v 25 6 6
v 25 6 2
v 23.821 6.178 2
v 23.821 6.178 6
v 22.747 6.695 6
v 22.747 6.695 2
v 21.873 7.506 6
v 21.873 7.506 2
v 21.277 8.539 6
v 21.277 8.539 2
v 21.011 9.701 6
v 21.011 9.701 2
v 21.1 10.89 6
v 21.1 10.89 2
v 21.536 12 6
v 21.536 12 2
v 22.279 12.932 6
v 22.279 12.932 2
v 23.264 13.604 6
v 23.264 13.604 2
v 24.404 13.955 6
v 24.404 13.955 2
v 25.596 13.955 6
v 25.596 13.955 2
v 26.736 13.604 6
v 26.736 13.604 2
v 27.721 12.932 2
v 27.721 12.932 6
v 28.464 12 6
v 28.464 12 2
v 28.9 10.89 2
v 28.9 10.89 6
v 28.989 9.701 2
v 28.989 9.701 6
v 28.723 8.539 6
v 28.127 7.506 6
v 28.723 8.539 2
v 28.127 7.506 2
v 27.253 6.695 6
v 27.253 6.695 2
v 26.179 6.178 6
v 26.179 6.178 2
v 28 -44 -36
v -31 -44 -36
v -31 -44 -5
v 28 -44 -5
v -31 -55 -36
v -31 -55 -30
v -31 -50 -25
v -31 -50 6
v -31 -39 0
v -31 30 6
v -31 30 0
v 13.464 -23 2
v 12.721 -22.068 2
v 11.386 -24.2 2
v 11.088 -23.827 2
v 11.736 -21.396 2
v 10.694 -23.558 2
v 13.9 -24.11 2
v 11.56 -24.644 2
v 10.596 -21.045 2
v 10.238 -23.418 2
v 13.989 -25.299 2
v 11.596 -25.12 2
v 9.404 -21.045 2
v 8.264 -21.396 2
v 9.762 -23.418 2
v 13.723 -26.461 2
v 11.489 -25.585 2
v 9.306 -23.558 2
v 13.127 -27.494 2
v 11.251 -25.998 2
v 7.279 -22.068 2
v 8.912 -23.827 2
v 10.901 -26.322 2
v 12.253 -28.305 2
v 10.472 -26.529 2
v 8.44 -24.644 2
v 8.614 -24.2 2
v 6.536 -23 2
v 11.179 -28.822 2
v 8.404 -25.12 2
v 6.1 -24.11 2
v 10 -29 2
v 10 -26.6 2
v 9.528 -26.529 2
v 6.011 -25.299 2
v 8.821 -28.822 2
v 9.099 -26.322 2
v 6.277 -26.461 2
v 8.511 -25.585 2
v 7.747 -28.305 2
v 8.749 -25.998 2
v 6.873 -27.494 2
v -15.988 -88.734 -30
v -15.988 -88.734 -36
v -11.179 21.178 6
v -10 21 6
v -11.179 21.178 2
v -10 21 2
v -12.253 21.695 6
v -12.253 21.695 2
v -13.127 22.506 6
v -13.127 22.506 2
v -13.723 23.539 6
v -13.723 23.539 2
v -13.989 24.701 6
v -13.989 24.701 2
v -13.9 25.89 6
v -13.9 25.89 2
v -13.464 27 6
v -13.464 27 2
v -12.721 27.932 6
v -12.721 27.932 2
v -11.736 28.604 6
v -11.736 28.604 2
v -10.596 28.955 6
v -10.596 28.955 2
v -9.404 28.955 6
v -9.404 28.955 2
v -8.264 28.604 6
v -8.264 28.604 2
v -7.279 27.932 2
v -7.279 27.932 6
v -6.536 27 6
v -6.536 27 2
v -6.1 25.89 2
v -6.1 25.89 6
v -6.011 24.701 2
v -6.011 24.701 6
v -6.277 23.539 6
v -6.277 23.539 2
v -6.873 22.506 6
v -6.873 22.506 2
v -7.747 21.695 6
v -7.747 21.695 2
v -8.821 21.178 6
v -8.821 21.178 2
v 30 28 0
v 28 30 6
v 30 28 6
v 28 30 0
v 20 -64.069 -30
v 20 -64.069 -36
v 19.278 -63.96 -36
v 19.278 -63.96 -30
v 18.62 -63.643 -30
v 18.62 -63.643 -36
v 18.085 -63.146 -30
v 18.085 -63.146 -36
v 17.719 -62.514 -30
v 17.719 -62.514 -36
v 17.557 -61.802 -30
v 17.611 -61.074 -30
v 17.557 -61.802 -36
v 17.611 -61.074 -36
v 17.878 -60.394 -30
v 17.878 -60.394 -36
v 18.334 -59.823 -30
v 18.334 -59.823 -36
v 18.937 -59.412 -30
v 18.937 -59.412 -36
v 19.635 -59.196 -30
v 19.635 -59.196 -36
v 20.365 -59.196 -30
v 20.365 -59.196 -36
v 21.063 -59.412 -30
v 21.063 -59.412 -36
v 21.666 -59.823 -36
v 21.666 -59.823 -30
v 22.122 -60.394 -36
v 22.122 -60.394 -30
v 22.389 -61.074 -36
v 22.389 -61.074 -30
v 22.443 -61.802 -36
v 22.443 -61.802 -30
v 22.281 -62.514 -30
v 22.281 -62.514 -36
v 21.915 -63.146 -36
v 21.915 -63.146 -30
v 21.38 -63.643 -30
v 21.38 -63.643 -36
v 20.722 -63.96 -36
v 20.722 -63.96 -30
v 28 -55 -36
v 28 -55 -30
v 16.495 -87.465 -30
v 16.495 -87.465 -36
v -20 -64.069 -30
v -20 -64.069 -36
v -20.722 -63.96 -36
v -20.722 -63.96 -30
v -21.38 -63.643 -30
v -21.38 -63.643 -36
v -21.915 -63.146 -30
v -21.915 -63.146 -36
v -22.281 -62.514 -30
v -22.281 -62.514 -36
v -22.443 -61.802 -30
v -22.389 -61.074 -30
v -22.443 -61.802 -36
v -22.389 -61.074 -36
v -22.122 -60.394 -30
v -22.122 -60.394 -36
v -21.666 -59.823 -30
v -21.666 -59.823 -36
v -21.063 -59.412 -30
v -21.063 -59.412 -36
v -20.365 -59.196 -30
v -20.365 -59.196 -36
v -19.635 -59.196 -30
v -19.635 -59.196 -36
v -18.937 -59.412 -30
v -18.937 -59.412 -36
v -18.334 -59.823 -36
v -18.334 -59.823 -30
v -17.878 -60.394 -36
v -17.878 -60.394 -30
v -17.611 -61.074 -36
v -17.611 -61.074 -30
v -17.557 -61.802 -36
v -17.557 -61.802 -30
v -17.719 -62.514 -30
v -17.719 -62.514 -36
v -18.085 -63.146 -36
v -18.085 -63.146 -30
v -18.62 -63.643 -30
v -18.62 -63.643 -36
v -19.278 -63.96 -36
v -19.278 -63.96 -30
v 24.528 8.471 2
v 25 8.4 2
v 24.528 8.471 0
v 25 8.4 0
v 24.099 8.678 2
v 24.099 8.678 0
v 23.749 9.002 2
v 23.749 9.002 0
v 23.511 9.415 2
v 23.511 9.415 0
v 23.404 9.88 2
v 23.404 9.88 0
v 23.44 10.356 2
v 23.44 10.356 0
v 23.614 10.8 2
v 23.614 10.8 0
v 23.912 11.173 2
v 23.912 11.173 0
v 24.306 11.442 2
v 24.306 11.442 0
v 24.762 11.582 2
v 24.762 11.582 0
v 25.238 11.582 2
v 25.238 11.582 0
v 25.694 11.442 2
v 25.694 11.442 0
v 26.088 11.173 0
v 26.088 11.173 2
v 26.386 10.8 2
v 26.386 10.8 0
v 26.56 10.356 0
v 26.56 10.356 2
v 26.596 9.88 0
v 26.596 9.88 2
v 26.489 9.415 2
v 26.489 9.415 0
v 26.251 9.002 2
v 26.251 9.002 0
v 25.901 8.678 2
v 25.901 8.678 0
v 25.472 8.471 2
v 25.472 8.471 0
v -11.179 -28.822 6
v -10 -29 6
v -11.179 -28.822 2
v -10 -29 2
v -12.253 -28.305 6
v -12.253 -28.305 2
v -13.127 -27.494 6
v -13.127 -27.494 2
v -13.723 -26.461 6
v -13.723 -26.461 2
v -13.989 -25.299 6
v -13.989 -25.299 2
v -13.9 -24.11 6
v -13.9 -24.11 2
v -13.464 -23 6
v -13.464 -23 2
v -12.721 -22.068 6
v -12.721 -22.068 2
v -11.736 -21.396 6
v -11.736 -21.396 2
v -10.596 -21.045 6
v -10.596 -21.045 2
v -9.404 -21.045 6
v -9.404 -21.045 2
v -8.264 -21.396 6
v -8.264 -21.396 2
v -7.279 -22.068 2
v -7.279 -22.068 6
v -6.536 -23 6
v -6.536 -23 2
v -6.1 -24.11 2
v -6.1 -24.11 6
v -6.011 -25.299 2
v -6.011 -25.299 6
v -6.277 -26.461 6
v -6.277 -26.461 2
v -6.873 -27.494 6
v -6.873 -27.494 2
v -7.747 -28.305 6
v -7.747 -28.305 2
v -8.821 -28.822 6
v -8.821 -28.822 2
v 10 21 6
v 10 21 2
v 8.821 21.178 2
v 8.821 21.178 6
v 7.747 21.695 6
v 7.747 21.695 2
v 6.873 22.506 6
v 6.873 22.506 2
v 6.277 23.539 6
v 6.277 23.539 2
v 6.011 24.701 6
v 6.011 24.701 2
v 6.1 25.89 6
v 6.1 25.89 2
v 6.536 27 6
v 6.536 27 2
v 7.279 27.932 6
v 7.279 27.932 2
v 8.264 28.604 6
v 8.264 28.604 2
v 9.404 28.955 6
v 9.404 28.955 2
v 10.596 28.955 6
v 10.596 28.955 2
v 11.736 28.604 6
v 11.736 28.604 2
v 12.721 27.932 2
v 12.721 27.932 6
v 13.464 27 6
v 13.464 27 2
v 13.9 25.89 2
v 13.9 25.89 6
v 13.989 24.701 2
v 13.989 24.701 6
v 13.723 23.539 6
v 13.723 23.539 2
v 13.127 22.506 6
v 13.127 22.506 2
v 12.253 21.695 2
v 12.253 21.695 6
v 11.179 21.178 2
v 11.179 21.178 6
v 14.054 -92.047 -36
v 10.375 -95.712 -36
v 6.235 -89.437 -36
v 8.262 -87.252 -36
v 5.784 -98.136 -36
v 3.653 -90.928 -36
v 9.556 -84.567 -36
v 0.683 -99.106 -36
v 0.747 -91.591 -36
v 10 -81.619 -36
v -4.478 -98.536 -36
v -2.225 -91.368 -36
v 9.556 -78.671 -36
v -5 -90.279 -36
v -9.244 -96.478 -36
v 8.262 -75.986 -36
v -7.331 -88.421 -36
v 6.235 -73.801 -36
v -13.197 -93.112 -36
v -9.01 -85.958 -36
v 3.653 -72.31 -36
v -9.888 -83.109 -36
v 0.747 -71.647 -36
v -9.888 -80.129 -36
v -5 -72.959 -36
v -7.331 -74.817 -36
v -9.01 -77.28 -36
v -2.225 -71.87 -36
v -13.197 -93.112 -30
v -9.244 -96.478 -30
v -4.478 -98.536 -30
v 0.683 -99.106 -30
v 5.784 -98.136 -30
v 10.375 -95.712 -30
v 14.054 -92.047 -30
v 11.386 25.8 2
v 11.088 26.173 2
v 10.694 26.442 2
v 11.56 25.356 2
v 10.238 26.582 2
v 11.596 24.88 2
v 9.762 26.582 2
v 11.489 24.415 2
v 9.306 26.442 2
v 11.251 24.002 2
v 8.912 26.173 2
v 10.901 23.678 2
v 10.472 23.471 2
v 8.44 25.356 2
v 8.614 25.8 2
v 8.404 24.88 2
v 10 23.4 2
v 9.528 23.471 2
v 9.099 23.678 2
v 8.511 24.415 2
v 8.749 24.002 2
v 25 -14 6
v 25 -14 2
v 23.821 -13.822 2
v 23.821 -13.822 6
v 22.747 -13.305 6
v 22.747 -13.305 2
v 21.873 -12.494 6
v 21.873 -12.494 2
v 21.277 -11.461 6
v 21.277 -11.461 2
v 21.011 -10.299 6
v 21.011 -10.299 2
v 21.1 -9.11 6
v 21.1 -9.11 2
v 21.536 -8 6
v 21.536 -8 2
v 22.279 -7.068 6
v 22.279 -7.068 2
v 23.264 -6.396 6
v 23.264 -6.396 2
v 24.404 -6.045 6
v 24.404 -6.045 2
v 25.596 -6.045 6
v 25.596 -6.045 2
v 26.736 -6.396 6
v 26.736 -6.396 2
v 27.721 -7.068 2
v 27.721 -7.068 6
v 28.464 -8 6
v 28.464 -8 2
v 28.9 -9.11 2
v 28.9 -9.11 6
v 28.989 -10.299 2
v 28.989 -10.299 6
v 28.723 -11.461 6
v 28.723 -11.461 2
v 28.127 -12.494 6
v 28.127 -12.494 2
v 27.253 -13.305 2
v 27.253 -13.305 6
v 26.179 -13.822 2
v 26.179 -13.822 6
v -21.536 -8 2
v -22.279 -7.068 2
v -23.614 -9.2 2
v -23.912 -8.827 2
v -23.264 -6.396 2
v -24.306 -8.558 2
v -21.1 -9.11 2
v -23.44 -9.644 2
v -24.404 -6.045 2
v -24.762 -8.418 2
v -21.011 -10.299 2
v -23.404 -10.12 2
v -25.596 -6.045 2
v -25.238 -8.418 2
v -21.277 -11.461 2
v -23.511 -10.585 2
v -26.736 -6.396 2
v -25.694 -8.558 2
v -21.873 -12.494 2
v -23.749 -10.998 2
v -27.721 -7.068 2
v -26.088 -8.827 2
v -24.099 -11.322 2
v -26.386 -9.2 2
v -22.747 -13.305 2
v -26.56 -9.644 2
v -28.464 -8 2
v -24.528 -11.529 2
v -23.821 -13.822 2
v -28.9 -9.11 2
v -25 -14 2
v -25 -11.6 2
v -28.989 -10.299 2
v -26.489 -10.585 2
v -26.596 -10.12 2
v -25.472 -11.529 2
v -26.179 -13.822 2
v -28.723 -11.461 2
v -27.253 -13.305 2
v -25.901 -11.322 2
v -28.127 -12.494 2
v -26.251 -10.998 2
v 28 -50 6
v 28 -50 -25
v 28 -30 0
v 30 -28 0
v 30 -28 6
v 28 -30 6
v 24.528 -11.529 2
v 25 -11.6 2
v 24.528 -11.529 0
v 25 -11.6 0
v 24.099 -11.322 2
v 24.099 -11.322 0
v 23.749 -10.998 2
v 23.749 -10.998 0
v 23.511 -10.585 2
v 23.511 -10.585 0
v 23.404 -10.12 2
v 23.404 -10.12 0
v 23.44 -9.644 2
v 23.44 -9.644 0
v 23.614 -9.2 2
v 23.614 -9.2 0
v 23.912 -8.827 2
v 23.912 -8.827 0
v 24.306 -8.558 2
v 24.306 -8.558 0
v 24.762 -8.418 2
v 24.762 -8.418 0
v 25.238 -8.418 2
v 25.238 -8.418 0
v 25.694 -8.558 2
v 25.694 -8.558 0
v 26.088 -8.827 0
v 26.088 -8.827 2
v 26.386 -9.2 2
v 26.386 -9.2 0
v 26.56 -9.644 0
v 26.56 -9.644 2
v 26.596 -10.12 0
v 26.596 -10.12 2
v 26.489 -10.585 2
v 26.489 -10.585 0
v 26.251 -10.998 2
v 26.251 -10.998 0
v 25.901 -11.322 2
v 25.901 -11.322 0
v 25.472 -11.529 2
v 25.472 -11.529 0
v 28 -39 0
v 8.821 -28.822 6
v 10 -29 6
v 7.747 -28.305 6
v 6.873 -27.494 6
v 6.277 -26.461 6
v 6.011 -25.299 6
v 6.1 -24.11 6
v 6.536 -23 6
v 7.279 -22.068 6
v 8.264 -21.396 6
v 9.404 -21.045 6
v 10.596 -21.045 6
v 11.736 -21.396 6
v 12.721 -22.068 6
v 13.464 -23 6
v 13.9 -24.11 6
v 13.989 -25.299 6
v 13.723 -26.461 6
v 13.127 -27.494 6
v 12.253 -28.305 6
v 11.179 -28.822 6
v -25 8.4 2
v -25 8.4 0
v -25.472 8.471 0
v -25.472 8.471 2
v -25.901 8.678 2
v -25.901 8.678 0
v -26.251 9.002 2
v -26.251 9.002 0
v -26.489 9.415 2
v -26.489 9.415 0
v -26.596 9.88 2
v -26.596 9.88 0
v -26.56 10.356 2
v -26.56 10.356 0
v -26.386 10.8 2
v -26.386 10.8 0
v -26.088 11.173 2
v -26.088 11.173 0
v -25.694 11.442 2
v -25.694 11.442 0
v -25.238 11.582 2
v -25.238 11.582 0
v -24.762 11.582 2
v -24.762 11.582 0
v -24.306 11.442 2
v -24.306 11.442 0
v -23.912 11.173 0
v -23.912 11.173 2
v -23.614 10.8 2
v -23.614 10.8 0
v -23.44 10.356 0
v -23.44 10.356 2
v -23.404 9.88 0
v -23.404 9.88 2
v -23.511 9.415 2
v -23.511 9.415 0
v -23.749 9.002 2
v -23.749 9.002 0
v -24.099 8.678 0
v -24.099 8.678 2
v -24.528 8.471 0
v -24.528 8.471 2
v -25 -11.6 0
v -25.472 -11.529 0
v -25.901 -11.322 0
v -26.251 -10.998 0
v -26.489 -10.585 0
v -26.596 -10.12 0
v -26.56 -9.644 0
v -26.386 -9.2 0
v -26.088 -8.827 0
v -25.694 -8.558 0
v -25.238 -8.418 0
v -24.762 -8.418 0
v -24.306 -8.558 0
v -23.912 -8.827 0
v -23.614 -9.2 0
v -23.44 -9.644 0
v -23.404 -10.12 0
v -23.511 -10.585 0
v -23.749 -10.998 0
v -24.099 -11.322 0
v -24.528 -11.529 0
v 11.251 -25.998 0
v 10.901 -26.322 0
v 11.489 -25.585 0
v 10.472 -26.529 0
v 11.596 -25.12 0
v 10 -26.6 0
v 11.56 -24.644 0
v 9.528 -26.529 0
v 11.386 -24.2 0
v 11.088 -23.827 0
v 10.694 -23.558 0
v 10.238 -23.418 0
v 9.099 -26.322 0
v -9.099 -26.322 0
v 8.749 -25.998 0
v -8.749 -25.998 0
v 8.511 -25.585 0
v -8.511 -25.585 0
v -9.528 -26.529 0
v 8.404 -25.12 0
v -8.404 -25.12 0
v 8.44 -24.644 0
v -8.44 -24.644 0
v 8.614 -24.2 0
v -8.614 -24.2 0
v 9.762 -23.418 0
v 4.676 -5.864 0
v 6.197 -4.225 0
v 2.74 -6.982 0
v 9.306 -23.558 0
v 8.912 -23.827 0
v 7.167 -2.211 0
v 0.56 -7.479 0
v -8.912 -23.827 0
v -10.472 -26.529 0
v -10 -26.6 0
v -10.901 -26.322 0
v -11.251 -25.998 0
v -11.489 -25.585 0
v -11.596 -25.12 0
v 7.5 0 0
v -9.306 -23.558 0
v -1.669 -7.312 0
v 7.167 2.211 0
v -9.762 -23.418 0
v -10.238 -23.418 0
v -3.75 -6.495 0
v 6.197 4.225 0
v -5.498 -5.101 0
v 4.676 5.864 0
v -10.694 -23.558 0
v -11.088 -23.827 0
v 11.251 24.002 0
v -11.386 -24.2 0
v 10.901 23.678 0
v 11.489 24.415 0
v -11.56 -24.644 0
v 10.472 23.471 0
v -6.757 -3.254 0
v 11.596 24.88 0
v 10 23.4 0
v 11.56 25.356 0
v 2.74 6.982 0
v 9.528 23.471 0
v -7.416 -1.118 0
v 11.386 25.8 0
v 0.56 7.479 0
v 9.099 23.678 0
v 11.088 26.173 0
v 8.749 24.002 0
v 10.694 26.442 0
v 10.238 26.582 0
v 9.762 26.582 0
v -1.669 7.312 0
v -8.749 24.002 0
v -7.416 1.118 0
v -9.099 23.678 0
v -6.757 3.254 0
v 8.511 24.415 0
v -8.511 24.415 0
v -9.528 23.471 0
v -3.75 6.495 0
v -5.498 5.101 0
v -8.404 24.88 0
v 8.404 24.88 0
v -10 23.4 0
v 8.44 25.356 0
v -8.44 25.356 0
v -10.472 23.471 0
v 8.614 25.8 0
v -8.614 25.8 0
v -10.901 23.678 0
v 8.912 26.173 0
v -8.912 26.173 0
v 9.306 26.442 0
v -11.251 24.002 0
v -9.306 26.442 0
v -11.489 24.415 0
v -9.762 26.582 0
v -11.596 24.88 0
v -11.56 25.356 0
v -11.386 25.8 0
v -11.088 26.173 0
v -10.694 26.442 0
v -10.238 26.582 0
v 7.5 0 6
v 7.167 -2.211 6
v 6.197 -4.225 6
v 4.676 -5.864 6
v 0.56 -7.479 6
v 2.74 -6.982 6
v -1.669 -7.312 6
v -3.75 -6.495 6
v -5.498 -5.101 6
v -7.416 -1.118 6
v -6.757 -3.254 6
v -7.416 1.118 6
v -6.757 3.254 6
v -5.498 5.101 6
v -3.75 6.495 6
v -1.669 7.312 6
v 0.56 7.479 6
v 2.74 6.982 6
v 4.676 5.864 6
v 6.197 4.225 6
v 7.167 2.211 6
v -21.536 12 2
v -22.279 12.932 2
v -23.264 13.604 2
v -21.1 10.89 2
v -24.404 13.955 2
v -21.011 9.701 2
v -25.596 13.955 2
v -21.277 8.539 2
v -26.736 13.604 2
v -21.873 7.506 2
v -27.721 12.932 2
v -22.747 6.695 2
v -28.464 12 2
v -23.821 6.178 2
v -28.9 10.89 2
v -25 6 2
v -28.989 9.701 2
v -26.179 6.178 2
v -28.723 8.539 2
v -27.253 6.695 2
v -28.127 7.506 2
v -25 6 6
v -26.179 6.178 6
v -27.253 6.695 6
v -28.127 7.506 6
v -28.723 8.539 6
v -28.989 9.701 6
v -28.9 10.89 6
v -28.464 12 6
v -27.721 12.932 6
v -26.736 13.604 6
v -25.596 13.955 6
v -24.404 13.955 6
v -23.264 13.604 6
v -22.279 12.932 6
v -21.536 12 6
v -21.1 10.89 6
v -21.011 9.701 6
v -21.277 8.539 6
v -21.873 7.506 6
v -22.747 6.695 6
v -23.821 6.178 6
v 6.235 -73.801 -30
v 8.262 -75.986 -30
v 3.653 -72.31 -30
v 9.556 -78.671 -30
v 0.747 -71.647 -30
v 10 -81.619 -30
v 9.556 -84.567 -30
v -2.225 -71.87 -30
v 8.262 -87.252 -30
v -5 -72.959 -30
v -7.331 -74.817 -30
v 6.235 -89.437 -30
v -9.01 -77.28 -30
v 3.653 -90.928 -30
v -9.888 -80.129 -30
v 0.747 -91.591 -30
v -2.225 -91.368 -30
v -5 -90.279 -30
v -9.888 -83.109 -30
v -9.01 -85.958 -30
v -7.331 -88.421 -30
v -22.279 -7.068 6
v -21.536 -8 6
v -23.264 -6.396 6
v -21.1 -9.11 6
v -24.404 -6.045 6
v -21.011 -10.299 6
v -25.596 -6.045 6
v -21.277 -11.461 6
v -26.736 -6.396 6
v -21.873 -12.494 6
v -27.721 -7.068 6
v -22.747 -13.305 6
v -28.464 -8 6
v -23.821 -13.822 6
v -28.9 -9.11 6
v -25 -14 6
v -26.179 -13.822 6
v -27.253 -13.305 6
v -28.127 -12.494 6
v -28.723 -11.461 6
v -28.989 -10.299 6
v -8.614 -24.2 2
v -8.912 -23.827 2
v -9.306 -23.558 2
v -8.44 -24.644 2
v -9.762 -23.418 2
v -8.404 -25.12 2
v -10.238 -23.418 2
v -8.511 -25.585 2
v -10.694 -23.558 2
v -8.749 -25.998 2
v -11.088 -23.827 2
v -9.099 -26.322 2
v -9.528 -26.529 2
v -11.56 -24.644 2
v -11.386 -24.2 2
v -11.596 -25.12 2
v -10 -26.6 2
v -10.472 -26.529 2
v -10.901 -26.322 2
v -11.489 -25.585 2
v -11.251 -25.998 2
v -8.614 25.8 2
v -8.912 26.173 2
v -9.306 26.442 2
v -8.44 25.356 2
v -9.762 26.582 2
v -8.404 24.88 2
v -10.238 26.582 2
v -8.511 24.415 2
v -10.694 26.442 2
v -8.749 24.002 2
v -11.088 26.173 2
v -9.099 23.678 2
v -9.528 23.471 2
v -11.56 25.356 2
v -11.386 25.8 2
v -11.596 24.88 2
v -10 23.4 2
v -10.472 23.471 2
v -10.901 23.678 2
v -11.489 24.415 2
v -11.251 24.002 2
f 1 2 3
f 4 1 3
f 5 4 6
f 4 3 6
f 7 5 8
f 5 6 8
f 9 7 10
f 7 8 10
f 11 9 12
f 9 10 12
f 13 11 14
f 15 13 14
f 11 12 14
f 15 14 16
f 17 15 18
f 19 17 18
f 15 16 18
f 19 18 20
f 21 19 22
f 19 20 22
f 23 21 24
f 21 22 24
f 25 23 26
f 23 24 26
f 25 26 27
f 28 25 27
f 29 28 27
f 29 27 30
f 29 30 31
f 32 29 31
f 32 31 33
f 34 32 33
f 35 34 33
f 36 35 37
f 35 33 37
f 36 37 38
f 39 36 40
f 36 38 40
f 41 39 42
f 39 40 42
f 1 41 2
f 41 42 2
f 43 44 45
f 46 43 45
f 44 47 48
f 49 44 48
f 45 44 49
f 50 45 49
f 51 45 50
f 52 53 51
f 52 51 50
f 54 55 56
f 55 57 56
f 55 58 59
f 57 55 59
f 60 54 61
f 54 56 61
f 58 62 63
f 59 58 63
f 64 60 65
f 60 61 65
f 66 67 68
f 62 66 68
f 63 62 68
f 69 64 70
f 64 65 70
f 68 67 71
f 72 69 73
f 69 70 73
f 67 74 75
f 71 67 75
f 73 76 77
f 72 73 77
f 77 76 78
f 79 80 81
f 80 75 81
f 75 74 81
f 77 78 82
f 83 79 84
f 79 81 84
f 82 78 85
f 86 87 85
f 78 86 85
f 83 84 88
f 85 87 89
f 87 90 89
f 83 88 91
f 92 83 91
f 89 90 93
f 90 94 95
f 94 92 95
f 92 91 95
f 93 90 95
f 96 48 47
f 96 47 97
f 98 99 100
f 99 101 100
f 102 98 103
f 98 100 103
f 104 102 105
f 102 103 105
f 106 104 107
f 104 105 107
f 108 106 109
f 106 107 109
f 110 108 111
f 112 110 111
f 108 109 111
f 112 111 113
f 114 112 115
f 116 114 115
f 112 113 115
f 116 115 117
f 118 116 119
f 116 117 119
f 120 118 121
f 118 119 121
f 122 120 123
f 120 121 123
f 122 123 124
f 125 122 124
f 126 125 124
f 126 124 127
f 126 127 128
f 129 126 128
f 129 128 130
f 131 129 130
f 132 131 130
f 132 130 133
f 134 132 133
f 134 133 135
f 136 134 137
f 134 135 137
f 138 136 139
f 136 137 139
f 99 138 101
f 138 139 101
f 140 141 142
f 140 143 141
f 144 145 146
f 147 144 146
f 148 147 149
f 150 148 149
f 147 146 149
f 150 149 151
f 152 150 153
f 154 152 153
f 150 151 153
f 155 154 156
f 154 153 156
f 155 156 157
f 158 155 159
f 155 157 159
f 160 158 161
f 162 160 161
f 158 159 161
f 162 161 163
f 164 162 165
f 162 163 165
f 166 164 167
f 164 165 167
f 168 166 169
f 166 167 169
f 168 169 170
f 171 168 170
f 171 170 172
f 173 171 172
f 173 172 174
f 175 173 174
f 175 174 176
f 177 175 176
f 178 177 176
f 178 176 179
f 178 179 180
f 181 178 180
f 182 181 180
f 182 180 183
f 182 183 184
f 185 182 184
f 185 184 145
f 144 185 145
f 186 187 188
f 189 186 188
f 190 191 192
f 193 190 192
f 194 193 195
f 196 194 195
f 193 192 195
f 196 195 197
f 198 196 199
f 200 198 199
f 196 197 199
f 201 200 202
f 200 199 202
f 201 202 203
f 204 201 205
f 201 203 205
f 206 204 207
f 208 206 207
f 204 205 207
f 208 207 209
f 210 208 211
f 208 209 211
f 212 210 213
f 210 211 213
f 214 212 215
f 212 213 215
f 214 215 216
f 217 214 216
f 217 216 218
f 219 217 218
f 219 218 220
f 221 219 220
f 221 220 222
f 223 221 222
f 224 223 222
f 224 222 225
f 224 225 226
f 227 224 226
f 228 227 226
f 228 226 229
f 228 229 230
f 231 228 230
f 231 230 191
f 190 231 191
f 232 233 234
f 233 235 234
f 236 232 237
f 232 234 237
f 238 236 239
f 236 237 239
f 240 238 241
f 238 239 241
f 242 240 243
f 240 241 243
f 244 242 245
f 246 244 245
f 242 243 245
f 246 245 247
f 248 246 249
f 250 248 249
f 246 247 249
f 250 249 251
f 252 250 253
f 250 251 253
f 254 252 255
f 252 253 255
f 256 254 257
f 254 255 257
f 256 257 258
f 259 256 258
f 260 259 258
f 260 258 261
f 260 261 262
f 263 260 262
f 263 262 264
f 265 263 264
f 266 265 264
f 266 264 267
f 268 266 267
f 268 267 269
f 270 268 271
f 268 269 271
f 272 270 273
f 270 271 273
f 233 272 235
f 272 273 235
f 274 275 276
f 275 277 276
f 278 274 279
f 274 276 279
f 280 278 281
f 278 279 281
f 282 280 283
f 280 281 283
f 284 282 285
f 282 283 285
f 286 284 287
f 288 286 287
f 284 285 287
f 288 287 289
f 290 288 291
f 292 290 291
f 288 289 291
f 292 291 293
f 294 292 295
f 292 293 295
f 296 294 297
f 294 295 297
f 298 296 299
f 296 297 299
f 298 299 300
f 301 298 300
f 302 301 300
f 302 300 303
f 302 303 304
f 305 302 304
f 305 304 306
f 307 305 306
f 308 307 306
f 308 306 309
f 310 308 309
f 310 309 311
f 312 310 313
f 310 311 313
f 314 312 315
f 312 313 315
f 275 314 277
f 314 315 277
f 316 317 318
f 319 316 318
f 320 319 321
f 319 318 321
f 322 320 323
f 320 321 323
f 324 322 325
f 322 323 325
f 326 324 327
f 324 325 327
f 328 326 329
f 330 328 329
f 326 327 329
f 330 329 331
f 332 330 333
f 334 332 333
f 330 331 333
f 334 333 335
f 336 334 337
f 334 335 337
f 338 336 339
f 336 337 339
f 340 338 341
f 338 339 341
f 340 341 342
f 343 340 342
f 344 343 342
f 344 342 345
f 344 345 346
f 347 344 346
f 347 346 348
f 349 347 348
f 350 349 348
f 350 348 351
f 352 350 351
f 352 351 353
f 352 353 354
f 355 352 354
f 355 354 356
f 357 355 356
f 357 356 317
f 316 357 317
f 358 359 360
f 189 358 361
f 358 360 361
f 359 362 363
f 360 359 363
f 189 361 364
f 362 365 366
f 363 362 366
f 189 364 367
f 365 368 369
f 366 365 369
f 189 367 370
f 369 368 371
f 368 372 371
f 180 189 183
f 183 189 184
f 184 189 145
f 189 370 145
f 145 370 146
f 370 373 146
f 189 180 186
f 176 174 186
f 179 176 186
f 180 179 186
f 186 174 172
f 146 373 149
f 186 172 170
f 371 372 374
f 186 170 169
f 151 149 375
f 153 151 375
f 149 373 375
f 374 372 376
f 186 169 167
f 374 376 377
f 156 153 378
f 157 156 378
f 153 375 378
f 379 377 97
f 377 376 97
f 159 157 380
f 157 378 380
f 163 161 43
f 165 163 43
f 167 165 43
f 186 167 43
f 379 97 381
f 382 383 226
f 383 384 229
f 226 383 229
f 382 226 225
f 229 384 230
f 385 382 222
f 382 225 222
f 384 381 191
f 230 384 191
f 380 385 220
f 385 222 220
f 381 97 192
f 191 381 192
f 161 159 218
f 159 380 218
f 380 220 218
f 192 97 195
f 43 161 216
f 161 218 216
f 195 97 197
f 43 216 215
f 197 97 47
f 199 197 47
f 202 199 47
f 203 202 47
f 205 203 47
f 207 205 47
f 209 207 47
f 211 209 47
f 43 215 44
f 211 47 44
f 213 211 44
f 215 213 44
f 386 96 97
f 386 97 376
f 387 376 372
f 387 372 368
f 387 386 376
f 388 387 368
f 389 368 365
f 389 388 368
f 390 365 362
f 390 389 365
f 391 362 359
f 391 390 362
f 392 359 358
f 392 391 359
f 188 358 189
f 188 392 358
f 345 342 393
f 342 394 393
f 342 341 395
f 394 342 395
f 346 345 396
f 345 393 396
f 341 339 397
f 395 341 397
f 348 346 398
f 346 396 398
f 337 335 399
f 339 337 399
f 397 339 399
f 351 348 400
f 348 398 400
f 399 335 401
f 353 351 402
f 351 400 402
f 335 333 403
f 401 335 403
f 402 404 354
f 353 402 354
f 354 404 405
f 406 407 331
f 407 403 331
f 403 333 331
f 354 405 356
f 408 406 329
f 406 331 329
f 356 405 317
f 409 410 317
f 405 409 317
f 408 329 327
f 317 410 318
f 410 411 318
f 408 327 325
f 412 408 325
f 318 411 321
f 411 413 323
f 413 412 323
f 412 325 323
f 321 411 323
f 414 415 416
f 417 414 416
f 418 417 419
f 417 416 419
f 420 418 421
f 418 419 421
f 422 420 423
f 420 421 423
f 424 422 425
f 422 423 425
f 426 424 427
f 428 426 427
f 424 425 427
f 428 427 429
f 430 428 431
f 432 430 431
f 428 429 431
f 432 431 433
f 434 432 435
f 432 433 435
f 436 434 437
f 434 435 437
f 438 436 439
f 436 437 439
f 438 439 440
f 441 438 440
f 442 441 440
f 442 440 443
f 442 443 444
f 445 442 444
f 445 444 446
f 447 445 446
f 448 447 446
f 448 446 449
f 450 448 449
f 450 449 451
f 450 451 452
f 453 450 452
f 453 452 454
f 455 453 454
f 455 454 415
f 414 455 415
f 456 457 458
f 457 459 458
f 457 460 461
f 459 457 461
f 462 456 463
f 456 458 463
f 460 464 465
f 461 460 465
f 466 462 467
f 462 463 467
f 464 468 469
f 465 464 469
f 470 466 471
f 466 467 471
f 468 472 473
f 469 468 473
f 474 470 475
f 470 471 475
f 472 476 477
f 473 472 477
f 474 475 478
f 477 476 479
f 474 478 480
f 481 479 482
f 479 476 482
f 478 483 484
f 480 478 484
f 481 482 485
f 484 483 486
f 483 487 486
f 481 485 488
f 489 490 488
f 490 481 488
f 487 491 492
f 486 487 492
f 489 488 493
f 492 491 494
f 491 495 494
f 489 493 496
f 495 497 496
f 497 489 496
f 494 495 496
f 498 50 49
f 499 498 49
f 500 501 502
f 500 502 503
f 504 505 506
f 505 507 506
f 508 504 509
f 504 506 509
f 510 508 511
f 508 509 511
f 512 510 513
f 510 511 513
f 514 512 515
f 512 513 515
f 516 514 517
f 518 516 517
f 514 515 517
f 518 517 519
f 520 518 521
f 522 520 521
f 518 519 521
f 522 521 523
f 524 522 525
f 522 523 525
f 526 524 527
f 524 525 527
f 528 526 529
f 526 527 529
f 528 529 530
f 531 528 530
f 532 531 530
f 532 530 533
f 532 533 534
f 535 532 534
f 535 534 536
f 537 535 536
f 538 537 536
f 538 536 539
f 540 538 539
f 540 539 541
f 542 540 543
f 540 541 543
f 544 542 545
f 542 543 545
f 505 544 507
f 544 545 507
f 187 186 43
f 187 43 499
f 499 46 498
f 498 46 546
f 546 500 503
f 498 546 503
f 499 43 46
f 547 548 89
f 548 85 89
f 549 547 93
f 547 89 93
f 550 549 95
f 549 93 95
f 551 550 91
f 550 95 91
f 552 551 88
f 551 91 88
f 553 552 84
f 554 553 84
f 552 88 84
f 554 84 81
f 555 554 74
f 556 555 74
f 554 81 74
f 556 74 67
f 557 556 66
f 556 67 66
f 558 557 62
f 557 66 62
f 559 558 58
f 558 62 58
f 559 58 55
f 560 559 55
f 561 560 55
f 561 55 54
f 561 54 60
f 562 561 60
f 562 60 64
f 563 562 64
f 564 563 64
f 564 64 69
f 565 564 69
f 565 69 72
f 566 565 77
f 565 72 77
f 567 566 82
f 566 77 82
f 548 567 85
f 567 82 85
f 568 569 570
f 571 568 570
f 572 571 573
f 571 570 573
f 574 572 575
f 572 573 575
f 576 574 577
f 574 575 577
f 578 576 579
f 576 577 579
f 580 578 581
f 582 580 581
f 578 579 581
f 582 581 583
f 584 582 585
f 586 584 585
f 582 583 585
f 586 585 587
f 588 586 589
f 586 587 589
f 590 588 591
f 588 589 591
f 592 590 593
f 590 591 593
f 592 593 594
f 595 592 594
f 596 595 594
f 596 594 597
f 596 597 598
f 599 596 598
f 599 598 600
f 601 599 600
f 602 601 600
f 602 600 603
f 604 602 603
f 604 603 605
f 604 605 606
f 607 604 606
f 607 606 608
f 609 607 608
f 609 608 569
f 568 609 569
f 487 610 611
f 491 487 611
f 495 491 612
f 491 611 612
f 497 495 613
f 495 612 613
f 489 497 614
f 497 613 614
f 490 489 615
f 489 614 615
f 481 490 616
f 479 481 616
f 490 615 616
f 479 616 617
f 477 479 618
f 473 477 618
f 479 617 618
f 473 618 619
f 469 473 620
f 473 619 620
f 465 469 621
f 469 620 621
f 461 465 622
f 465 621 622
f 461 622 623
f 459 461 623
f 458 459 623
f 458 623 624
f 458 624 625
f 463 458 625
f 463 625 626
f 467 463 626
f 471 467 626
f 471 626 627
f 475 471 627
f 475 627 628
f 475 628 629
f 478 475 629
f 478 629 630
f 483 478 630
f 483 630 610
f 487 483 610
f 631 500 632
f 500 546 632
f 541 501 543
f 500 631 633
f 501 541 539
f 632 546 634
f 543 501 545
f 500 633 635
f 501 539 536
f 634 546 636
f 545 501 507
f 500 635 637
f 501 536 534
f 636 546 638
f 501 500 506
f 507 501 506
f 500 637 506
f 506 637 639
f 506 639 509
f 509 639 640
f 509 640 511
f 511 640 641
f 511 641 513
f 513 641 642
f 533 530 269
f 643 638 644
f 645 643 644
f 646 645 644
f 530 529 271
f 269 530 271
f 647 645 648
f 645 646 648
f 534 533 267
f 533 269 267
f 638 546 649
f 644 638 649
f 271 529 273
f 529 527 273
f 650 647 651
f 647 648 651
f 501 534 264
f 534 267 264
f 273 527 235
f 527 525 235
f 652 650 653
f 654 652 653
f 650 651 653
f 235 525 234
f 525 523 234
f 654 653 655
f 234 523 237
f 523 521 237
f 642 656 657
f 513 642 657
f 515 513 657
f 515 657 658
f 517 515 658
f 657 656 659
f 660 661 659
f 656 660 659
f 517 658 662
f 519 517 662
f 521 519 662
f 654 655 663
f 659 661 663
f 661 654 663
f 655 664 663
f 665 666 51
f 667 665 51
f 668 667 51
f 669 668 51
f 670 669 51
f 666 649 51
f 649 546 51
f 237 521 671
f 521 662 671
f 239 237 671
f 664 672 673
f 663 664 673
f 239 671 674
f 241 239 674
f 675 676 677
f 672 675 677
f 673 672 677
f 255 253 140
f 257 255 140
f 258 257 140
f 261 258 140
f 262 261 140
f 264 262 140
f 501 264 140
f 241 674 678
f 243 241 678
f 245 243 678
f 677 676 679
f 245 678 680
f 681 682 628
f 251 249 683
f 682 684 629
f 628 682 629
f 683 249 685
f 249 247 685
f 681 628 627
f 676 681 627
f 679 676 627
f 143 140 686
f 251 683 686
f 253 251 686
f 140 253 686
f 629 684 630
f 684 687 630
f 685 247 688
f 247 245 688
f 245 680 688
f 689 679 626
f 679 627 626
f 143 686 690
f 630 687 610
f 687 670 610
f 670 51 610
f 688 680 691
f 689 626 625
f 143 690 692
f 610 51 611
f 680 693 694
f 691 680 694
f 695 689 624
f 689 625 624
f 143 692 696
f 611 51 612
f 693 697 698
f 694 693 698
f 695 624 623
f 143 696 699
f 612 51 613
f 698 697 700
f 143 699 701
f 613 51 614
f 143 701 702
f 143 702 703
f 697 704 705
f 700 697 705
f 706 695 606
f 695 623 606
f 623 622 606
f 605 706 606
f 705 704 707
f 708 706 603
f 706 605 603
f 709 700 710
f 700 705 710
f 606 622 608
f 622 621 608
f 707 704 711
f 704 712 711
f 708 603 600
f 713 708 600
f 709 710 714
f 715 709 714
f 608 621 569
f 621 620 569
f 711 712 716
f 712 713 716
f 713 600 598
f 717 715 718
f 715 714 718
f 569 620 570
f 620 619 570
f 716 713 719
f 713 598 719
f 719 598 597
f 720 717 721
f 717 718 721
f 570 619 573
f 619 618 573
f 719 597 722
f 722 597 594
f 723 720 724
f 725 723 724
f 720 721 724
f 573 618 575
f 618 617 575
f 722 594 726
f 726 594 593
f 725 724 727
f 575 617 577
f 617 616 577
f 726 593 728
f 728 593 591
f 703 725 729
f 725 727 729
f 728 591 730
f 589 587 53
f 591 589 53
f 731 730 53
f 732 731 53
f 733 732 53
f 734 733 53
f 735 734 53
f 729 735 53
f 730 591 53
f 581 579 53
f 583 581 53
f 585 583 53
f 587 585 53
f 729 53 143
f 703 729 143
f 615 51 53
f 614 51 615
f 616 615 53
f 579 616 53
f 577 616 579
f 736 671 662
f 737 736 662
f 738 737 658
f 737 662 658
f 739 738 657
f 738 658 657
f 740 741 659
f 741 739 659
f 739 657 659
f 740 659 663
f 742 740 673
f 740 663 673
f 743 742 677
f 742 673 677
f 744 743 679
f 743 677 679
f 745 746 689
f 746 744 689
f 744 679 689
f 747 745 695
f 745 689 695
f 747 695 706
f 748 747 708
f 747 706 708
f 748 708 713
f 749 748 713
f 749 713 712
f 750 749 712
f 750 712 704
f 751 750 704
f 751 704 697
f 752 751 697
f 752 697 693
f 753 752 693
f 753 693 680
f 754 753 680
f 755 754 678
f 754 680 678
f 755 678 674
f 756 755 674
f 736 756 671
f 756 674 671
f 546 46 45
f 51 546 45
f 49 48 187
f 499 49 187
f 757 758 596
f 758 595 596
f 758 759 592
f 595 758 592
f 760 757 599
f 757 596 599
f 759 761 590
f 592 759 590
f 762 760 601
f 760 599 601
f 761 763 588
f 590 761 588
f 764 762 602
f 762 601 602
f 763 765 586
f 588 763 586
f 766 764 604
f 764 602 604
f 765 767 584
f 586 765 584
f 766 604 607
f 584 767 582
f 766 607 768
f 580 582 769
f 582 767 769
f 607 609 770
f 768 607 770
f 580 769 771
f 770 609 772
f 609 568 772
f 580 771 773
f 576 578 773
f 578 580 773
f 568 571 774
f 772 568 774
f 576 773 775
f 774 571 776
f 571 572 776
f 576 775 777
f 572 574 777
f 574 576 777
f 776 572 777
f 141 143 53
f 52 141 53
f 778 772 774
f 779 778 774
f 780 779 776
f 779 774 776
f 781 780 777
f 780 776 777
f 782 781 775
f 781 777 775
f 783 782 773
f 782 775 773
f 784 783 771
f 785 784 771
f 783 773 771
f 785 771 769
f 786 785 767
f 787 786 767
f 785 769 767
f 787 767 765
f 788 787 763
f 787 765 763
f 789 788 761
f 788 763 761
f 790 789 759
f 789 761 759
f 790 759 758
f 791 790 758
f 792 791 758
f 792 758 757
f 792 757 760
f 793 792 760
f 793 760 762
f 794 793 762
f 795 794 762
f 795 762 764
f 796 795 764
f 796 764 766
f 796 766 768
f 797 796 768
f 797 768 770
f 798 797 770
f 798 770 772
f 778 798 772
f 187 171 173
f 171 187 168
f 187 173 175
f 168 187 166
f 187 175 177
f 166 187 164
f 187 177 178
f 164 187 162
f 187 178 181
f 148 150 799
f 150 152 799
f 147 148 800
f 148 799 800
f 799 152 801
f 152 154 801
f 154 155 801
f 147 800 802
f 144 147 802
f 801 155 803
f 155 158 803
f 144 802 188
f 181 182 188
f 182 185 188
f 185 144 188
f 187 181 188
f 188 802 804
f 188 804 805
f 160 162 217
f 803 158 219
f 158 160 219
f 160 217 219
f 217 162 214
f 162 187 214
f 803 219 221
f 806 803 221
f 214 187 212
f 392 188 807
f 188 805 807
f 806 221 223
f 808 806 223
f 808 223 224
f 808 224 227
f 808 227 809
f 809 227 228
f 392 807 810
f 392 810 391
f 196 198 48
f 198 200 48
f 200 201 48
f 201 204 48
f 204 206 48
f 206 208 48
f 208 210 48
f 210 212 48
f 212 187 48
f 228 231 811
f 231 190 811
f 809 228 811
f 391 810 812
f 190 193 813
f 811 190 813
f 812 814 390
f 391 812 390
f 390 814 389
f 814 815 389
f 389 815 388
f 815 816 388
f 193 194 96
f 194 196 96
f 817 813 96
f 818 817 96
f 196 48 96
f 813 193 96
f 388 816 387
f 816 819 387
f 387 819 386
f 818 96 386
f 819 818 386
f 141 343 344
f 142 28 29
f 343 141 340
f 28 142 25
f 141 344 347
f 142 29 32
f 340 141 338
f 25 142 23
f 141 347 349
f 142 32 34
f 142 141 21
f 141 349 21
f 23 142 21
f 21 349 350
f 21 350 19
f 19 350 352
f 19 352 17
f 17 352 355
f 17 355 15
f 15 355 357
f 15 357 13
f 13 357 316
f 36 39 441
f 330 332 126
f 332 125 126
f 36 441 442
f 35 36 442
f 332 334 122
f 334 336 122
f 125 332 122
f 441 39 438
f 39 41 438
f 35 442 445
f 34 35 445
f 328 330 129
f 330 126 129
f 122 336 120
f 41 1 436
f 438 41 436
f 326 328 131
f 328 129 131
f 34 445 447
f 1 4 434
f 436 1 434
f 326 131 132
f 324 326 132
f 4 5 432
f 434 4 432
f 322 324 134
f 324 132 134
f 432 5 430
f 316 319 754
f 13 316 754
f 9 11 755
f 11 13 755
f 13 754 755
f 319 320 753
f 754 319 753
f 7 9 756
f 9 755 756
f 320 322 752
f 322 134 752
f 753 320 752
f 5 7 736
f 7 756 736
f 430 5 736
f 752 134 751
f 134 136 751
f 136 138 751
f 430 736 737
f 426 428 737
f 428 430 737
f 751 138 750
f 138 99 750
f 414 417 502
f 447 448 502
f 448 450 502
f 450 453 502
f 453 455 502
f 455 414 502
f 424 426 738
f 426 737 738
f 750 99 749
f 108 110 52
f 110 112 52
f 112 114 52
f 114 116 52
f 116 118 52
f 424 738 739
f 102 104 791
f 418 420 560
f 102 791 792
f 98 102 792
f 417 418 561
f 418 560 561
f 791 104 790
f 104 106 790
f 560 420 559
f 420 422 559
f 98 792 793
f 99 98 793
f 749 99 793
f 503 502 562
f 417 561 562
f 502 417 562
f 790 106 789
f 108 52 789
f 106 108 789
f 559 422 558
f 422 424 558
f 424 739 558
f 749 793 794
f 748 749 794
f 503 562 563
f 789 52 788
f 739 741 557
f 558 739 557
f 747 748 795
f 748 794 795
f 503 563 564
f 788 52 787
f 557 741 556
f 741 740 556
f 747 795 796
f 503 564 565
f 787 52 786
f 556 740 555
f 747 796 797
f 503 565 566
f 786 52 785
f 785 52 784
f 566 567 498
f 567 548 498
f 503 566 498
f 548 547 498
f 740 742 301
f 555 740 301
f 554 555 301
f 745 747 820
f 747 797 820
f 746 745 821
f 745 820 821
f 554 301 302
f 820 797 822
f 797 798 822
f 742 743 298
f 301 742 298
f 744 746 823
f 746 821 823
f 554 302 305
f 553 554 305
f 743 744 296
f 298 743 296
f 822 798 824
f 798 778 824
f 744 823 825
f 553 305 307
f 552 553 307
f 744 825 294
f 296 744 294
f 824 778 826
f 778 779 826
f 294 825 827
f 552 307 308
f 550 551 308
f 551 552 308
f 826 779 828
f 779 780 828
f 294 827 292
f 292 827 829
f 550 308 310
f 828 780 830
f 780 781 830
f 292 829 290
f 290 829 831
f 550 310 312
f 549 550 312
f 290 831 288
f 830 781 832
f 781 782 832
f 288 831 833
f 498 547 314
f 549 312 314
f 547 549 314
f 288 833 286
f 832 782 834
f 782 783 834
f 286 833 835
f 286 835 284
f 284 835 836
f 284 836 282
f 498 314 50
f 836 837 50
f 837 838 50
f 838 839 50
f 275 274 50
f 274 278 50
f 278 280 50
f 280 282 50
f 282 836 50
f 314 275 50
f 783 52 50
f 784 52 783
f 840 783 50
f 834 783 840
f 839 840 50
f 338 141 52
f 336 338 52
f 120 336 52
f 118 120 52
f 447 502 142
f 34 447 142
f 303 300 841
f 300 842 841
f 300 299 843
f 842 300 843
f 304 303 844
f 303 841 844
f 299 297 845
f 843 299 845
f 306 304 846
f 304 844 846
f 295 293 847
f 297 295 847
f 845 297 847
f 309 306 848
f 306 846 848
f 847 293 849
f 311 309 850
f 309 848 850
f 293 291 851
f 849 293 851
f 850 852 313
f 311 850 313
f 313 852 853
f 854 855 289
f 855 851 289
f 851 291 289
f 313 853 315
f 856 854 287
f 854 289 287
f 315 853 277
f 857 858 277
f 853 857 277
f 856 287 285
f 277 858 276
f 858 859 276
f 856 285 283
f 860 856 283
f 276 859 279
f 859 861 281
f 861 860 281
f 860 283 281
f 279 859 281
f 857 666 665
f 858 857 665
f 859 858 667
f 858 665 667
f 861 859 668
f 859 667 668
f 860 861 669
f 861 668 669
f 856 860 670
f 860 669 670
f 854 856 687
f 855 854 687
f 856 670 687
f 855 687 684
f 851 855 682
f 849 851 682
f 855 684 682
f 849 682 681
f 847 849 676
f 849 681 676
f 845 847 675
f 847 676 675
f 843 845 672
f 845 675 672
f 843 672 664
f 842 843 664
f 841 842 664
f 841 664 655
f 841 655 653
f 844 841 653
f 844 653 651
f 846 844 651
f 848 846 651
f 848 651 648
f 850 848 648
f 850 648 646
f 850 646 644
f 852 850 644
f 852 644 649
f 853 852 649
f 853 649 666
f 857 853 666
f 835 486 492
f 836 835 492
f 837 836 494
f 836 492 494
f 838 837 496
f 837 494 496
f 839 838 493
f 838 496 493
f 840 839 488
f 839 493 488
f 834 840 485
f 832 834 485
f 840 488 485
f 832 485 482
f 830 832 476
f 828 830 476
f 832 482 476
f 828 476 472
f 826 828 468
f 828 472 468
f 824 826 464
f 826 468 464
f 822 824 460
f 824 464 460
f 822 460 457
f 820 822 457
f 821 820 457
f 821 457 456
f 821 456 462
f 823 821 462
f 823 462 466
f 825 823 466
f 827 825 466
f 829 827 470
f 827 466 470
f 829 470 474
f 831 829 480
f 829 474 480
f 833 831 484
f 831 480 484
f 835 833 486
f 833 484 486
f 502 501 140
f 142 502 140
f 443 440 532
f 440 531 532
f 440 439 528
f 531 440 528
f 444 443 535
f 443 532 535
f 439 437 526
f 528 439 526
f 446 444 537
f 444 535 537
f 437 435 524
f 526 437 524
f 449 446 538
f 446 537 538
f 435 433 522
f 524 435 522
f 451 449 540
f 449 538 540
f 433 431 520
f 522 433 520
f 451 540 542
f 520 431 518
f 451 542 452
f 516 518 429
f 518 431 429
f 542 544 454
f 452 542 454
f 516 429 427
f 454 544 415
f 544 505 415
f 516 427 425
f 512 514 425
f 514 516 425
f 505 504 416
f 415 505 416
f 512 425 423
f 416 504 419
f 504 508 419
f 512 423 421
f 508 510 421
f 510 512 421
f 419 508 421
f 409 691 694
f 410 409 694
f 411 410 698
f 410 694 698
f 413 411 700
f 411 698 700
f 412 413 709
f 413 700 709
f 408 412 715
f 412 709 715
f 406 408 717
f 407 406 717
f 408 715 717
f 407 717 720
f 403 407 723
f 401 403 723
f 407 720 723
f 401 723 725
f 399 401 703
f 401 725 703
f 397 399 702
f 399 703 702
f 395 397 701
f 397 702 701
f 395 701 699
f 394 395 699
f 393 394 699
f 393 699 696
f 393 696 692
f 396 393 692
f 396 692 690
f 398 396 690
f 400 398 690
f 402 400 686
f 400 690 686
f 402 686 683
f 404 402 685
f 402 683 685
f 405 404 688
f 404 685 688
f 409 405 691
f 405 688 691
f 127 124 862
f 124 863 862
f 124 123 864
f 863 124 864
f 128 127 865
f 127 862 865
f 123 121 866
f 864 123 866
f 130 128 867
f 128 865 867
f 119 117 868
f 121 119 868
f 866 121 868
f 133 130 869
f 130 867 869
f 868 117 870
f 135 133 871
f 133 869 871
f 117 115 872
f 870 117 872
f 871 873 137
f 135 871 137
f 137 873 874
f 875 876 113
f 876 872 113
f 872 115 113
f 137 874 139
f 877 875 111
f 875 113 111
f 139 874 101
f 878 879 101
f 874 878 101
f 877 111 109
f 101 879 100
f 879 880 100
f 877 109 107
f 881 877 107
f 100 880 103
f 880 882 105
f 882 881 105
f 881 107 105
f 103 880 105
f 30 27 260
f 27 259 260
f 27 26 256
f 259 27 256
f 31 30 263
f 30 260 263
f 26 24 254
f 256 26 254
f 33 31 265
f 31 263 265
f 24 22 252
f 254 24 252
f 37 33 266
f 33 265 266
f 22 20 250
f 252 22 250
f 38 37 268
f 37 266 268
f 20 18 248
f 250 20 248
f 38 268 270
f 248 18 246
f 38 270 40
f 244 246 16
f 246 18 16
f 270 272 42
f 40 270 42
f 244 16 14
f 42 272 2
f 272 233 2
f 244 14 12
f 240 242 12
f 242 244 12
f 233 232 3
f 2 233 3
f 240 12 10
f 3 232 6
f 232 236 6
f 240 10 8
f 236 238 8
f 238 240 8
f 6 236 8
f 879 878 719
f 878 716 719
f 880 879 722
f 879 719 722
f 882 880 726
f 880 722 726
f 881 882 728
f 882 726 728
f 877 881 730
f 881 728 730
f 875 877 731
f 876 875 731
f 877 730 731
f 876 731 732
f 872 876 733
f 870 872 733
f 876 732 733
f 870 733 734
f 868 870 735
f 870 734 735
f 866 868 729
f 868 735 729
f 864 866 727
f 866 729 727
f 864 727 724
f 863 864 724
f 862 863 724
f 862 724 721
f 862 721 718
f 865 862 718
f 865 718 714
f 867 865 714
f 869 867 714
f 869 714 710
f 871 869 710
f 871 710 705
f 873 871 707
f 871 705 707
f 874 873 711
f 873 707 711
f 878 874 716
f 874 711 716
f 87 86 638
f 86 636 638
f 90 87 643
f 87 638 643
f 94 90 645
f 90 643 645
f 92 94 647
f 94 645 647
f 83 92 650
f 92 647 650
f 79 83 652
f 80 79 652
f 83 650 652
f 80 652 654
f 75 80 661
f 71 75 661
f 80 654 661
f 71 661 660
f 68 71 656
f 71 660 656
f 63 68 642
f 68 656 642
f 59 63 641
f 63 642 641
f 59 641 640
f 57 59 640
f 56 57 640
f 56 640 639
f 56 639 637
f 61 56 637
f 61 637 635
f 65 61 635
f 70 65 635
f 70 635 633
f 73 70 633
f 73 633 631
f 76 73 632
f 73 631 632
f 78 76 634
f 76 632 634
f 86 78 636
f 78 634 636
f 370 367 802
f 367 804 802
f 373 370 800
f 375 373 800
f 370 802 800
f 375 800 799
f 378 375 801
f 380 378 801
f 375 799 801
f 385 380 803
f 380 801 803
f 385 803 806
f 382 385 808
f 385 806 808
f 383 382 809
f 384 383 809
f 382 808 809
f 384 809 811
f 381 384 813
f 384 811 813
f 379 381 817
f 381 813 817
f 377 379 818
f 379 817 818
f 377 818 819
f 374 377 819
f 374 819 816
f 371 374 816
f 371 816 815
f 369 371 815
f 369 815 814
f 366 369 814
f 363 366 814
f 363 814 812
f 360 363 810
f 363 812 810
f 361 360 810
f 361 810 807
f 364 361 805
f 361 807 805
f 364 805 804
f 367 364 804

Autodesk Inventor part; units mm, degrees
ref_plane "YZ Plane" through (0, 0, 0) normal (1, 0, 0) x (0, 1, 0)
ref_plane "XZ Plane" through (0, 0, 0) normal (0, 1, 0) x (-1, 0, 0)
ref_plane "XY Plane" through (0, 0, 0) normal (0, 0, 1) x (1, 0, 0)
ref_plane "Work Plane1" through (0, 0, 0) normal (0, 0, 1) x (1, 0, 0)
sketch "Sketch1" plane through (0, 0, 0) normal (0, 0, 1) x (1, 0, 0)
  circle A0 centre (-10, -25) radius 1.45 projected
  circle A1 centre (-10, 25) radius 1.45 projected
  circle A2 centre (10, 25) radius 1.45 projected
  circle A3 centre (10, -25) radius 1.45 projected
  circle A4 centre (-25, 25) radius 2.325 projected
  circle A5 centre (25, -25) radius 2.325 projected
  circle A6 centre (-25, -25) radius 2.325 projected
  circle A7 centre (25, 25) radius 2.325 projected
  line L0 (28, 30) -> (30, 28) projected
  line L1 (28, 30) -> (-28, 30) projected
  line L2 (-30, 28) -> (-28, 30) projected
  line L3 (-30, 28) -> (-30, -28) projected
  line L4 (-28, -30) -> (-30, -28) projected
  line L5 (-28, -30) -> (28, -30) projected
  line L6 (30, -28) -> (28, -30) projected
  line L7 (30, -28) -> (30, 28) projected
  circle A8 centre (-17.5, -17.5) radius 1.95 projected
  circle A9 centre (17.5, 17.5) radius 1.95 projected
  circle A10 centre (17.5, -17.5) radius 1.95 projected
  circle A11 centre (-17.5, 17.5) radius 1.95 projected
  circle A12 centre (0, 0) radius 7.5 projected
  circle A13 centre (-25.33, -75.26) radius 6.15 projected
  circle A14 centre (25, -10) radius 1.45 projected
  circle A15 centre (-25, -10) radius 1.45 projected
  circle A16 centre (-25, 10) radius 1.45 projected
  circle A17 centre (25, 10) radius 1.45 projected
  line L8 (-28, -30) -> (-31, -30)
  line L9 (-31, -30) -> (-31, 30)
  line L10 (-31, 30) -> (-28, 30)
  line L11 (-28, 30) -> (-28, -30)
  point P0 (0, 0)
  dimension "d0" = 3
extrude "Extrusion1" add sketch "Sketch1" along normal blind 6 contours A4 | A5 | A6 | A7 | L0 L7 L6 L5 L11 L1 | L11 L4 L3 L2 | L2 L3 L4 L8 L9 L10 | A8 | A9 | A10 | A11
ref_plane "Work Plane3" through (0, 0, 19) normal (0, 0, 1) x (1, 0, 0)
sketch "Sketch7" plane through (0, 0, 6) normal (0, 0, 1) x (1, 0, 0)
  circle A0 centre (10, -25) radius 1.45 projected
  circle A1 centre (-10, -25) radius 1.45 projected
  circle A2 centre (-25, -10) radius 1.45 projected
  circle A3 centre (-25, 10) radius 1.45 projected
  circle A4 centre (-10, 25) radius 1.45 projected
  circle A5 centre (10, 25) radius 1.45 projected
  circle A6 centre (25, 10) radius 1.45 projected
  circle A7 centre (25, -10) radius 1.45 projected
  point P0 (0, 0)
hole "Hole1" at (-25, -10, 6) at (-25, 10, 6) at (-10, 25, 6) at (10, 25, 6) at (25, 10, 6) at (25, -10, 6) at (10, -25, 6) at (-10, -25, 6) direction (0, 0, -1) diameter 3.2 end through all counterbore diameter 8 counterbore depth 4
sketch "Sketch10" plane through (-31, -30, 0) normal (-1, 0, 0) x (0, 0, 1)
  line L0 (2, 16) -> (2, 24) projected
  line L1 (0, 0) -> (0, 60) projected
  line L2 (0, 0) -> (6, 0) projected
  line L3 (6, 60) -> (6, 0) projected
  line L4 (0, 60) -> (6, 60) projected
  line L5 (6, 0) -> (6, -20)
  line L6 (6, -20) -> (-30, -20)
  line L7 (-30, -20) -> (-30, -83.2379)
  line L8 (-30, -83.2379) -> (-36, -83.2379)
  line L9 (-36, -83.2379) -> (-36, -14)
  line L10 (-36, -14) -> (0, -14)
  line L11 (0, -14) -> (0, 0)
  line L12 (6, 60) -> (6, 0) projected
  line L13 (0, 0) -> (6, 0)
  point P0 (0, 30)
  dimension "d55" = 20
  dimension "d56" = 90
  dimension "d57" = 6
  dimension "d58" = 90
  dimension "d59" = 90
  dimension "d60" = 90
  dimension "d61" = 30
  dimension "d71" = 6
extrude "Extrusion9" add sketch "Sketch10" against normal up to surface (59 mm away) contours L2 L5 L6 L7 L8 L9 L10 L11
sketch "Sketch11" plane through (-31, -113.2379, -30) normal (0, 0, 1) x (1, 0, 0)
  line L0 (59, 63.2379) -> (59, 0) projected
  line L1 (0, 63.2379) -> (59, 63.2379) projected
  line L2 (0, 0) -> (0, 63.2379) projected
  line L3 (0, 0) -> (59, 0) projected
  circle A0 centre (31, 31.6189) radius 10
  point P0 (31, 113.2379)
  dimension "d65" = 20
extrude "Extrusion10" cut sketch "Sketch11" against normal blind 10 contours A0
chamfer "Chamfer3" distance 5 angle 45 2 edges at (-1.5, -50, -30) (-1.5, -44, 0)
sketch "Sketch12" plane through (-31, -113.2379, -30) normal (0, 0, 1) x (1, 0, 0)
  line L0 (0, 58.2379) -> (59, 58.2379) projected
  line L1 (0, 0) -> (0, 58.2379) projected
  line L2 (0, 0) -> (59, 0) projected
  line L3 (59, 58.2379) -> (59, 0) projected
  circle A0 centre (31, 31.6189) radius 10 projected
  line L4 (51, 51.6189) -> (11, 51.6189)
  line L5 (11, 51.6189) -> (11, 11.6189)
  line L6 (11, 11.6189) -> (51, 11.6189)
  line L7 (51, 11.6189) -> (51, 51.6189)
  line L8 (51, 51.6189) -> (11, 11.6189) construction
  line L9 (11, 51.6189) -> (51, 11.6189) construction
  point P0 (31, 113.2379)
  dimension "d72" = 40
  dimension "d73" = 40
hole "Hole2" at (-20, -101.6189, -30) at (-20, -61.6189, -30) at (20, -61.6189, -30) at (20, -101.6189, -30) direction (0, 0, -1) diameter 4.9 end through all
sketch "Sketch13" plane through (-31, -113.2379, -30) normal (0, 0, 1) x (1, 0, 0)
  circle A0 centre (51, 51.6189) radius 2.45 projected
  circle A1 centre (11, 11.6189) radius 2.45 projected
  circle A2 centre (11, 51.6189) radius 2.45 projected
  circle A3 centre (51, 11.6189) radius 2.45 projected
  line L0 (0, 58.2379) -> (59, 58.2379) projected
  line L1 (0, 0) -> (0, 58.2379) projected
  line L2 (0, 0) -> (59, 0) projected
  line L3 (59, 58.2379) -> (59, 0) projected
  circle A4 centre (31, 31.6189) radius 10 projected
  circle A5 centre (31, 31.6189) radius 17.5
  line L4 (0, 58.2379) -> (15.0116, 24.5041)
  line L5 (0, 58.2379) -> (59, 58.2379) projected
  line L6 (59, 58.2379) -> (47.4948, 25.7733)
  point P0 (31, 113.2379)
  dimension "d81" = 35
extrude "Extrusion11" cut sketch "Sketch13" against normal through all contours L4 A5 L6 L3 L2 L1
equation "\"d57\" = d1"
equation "\"d71\" = d1"
equation "\"d1\" = 6"
properties part number "cellSTORM_UC2_Sample_arm_ptycho"
